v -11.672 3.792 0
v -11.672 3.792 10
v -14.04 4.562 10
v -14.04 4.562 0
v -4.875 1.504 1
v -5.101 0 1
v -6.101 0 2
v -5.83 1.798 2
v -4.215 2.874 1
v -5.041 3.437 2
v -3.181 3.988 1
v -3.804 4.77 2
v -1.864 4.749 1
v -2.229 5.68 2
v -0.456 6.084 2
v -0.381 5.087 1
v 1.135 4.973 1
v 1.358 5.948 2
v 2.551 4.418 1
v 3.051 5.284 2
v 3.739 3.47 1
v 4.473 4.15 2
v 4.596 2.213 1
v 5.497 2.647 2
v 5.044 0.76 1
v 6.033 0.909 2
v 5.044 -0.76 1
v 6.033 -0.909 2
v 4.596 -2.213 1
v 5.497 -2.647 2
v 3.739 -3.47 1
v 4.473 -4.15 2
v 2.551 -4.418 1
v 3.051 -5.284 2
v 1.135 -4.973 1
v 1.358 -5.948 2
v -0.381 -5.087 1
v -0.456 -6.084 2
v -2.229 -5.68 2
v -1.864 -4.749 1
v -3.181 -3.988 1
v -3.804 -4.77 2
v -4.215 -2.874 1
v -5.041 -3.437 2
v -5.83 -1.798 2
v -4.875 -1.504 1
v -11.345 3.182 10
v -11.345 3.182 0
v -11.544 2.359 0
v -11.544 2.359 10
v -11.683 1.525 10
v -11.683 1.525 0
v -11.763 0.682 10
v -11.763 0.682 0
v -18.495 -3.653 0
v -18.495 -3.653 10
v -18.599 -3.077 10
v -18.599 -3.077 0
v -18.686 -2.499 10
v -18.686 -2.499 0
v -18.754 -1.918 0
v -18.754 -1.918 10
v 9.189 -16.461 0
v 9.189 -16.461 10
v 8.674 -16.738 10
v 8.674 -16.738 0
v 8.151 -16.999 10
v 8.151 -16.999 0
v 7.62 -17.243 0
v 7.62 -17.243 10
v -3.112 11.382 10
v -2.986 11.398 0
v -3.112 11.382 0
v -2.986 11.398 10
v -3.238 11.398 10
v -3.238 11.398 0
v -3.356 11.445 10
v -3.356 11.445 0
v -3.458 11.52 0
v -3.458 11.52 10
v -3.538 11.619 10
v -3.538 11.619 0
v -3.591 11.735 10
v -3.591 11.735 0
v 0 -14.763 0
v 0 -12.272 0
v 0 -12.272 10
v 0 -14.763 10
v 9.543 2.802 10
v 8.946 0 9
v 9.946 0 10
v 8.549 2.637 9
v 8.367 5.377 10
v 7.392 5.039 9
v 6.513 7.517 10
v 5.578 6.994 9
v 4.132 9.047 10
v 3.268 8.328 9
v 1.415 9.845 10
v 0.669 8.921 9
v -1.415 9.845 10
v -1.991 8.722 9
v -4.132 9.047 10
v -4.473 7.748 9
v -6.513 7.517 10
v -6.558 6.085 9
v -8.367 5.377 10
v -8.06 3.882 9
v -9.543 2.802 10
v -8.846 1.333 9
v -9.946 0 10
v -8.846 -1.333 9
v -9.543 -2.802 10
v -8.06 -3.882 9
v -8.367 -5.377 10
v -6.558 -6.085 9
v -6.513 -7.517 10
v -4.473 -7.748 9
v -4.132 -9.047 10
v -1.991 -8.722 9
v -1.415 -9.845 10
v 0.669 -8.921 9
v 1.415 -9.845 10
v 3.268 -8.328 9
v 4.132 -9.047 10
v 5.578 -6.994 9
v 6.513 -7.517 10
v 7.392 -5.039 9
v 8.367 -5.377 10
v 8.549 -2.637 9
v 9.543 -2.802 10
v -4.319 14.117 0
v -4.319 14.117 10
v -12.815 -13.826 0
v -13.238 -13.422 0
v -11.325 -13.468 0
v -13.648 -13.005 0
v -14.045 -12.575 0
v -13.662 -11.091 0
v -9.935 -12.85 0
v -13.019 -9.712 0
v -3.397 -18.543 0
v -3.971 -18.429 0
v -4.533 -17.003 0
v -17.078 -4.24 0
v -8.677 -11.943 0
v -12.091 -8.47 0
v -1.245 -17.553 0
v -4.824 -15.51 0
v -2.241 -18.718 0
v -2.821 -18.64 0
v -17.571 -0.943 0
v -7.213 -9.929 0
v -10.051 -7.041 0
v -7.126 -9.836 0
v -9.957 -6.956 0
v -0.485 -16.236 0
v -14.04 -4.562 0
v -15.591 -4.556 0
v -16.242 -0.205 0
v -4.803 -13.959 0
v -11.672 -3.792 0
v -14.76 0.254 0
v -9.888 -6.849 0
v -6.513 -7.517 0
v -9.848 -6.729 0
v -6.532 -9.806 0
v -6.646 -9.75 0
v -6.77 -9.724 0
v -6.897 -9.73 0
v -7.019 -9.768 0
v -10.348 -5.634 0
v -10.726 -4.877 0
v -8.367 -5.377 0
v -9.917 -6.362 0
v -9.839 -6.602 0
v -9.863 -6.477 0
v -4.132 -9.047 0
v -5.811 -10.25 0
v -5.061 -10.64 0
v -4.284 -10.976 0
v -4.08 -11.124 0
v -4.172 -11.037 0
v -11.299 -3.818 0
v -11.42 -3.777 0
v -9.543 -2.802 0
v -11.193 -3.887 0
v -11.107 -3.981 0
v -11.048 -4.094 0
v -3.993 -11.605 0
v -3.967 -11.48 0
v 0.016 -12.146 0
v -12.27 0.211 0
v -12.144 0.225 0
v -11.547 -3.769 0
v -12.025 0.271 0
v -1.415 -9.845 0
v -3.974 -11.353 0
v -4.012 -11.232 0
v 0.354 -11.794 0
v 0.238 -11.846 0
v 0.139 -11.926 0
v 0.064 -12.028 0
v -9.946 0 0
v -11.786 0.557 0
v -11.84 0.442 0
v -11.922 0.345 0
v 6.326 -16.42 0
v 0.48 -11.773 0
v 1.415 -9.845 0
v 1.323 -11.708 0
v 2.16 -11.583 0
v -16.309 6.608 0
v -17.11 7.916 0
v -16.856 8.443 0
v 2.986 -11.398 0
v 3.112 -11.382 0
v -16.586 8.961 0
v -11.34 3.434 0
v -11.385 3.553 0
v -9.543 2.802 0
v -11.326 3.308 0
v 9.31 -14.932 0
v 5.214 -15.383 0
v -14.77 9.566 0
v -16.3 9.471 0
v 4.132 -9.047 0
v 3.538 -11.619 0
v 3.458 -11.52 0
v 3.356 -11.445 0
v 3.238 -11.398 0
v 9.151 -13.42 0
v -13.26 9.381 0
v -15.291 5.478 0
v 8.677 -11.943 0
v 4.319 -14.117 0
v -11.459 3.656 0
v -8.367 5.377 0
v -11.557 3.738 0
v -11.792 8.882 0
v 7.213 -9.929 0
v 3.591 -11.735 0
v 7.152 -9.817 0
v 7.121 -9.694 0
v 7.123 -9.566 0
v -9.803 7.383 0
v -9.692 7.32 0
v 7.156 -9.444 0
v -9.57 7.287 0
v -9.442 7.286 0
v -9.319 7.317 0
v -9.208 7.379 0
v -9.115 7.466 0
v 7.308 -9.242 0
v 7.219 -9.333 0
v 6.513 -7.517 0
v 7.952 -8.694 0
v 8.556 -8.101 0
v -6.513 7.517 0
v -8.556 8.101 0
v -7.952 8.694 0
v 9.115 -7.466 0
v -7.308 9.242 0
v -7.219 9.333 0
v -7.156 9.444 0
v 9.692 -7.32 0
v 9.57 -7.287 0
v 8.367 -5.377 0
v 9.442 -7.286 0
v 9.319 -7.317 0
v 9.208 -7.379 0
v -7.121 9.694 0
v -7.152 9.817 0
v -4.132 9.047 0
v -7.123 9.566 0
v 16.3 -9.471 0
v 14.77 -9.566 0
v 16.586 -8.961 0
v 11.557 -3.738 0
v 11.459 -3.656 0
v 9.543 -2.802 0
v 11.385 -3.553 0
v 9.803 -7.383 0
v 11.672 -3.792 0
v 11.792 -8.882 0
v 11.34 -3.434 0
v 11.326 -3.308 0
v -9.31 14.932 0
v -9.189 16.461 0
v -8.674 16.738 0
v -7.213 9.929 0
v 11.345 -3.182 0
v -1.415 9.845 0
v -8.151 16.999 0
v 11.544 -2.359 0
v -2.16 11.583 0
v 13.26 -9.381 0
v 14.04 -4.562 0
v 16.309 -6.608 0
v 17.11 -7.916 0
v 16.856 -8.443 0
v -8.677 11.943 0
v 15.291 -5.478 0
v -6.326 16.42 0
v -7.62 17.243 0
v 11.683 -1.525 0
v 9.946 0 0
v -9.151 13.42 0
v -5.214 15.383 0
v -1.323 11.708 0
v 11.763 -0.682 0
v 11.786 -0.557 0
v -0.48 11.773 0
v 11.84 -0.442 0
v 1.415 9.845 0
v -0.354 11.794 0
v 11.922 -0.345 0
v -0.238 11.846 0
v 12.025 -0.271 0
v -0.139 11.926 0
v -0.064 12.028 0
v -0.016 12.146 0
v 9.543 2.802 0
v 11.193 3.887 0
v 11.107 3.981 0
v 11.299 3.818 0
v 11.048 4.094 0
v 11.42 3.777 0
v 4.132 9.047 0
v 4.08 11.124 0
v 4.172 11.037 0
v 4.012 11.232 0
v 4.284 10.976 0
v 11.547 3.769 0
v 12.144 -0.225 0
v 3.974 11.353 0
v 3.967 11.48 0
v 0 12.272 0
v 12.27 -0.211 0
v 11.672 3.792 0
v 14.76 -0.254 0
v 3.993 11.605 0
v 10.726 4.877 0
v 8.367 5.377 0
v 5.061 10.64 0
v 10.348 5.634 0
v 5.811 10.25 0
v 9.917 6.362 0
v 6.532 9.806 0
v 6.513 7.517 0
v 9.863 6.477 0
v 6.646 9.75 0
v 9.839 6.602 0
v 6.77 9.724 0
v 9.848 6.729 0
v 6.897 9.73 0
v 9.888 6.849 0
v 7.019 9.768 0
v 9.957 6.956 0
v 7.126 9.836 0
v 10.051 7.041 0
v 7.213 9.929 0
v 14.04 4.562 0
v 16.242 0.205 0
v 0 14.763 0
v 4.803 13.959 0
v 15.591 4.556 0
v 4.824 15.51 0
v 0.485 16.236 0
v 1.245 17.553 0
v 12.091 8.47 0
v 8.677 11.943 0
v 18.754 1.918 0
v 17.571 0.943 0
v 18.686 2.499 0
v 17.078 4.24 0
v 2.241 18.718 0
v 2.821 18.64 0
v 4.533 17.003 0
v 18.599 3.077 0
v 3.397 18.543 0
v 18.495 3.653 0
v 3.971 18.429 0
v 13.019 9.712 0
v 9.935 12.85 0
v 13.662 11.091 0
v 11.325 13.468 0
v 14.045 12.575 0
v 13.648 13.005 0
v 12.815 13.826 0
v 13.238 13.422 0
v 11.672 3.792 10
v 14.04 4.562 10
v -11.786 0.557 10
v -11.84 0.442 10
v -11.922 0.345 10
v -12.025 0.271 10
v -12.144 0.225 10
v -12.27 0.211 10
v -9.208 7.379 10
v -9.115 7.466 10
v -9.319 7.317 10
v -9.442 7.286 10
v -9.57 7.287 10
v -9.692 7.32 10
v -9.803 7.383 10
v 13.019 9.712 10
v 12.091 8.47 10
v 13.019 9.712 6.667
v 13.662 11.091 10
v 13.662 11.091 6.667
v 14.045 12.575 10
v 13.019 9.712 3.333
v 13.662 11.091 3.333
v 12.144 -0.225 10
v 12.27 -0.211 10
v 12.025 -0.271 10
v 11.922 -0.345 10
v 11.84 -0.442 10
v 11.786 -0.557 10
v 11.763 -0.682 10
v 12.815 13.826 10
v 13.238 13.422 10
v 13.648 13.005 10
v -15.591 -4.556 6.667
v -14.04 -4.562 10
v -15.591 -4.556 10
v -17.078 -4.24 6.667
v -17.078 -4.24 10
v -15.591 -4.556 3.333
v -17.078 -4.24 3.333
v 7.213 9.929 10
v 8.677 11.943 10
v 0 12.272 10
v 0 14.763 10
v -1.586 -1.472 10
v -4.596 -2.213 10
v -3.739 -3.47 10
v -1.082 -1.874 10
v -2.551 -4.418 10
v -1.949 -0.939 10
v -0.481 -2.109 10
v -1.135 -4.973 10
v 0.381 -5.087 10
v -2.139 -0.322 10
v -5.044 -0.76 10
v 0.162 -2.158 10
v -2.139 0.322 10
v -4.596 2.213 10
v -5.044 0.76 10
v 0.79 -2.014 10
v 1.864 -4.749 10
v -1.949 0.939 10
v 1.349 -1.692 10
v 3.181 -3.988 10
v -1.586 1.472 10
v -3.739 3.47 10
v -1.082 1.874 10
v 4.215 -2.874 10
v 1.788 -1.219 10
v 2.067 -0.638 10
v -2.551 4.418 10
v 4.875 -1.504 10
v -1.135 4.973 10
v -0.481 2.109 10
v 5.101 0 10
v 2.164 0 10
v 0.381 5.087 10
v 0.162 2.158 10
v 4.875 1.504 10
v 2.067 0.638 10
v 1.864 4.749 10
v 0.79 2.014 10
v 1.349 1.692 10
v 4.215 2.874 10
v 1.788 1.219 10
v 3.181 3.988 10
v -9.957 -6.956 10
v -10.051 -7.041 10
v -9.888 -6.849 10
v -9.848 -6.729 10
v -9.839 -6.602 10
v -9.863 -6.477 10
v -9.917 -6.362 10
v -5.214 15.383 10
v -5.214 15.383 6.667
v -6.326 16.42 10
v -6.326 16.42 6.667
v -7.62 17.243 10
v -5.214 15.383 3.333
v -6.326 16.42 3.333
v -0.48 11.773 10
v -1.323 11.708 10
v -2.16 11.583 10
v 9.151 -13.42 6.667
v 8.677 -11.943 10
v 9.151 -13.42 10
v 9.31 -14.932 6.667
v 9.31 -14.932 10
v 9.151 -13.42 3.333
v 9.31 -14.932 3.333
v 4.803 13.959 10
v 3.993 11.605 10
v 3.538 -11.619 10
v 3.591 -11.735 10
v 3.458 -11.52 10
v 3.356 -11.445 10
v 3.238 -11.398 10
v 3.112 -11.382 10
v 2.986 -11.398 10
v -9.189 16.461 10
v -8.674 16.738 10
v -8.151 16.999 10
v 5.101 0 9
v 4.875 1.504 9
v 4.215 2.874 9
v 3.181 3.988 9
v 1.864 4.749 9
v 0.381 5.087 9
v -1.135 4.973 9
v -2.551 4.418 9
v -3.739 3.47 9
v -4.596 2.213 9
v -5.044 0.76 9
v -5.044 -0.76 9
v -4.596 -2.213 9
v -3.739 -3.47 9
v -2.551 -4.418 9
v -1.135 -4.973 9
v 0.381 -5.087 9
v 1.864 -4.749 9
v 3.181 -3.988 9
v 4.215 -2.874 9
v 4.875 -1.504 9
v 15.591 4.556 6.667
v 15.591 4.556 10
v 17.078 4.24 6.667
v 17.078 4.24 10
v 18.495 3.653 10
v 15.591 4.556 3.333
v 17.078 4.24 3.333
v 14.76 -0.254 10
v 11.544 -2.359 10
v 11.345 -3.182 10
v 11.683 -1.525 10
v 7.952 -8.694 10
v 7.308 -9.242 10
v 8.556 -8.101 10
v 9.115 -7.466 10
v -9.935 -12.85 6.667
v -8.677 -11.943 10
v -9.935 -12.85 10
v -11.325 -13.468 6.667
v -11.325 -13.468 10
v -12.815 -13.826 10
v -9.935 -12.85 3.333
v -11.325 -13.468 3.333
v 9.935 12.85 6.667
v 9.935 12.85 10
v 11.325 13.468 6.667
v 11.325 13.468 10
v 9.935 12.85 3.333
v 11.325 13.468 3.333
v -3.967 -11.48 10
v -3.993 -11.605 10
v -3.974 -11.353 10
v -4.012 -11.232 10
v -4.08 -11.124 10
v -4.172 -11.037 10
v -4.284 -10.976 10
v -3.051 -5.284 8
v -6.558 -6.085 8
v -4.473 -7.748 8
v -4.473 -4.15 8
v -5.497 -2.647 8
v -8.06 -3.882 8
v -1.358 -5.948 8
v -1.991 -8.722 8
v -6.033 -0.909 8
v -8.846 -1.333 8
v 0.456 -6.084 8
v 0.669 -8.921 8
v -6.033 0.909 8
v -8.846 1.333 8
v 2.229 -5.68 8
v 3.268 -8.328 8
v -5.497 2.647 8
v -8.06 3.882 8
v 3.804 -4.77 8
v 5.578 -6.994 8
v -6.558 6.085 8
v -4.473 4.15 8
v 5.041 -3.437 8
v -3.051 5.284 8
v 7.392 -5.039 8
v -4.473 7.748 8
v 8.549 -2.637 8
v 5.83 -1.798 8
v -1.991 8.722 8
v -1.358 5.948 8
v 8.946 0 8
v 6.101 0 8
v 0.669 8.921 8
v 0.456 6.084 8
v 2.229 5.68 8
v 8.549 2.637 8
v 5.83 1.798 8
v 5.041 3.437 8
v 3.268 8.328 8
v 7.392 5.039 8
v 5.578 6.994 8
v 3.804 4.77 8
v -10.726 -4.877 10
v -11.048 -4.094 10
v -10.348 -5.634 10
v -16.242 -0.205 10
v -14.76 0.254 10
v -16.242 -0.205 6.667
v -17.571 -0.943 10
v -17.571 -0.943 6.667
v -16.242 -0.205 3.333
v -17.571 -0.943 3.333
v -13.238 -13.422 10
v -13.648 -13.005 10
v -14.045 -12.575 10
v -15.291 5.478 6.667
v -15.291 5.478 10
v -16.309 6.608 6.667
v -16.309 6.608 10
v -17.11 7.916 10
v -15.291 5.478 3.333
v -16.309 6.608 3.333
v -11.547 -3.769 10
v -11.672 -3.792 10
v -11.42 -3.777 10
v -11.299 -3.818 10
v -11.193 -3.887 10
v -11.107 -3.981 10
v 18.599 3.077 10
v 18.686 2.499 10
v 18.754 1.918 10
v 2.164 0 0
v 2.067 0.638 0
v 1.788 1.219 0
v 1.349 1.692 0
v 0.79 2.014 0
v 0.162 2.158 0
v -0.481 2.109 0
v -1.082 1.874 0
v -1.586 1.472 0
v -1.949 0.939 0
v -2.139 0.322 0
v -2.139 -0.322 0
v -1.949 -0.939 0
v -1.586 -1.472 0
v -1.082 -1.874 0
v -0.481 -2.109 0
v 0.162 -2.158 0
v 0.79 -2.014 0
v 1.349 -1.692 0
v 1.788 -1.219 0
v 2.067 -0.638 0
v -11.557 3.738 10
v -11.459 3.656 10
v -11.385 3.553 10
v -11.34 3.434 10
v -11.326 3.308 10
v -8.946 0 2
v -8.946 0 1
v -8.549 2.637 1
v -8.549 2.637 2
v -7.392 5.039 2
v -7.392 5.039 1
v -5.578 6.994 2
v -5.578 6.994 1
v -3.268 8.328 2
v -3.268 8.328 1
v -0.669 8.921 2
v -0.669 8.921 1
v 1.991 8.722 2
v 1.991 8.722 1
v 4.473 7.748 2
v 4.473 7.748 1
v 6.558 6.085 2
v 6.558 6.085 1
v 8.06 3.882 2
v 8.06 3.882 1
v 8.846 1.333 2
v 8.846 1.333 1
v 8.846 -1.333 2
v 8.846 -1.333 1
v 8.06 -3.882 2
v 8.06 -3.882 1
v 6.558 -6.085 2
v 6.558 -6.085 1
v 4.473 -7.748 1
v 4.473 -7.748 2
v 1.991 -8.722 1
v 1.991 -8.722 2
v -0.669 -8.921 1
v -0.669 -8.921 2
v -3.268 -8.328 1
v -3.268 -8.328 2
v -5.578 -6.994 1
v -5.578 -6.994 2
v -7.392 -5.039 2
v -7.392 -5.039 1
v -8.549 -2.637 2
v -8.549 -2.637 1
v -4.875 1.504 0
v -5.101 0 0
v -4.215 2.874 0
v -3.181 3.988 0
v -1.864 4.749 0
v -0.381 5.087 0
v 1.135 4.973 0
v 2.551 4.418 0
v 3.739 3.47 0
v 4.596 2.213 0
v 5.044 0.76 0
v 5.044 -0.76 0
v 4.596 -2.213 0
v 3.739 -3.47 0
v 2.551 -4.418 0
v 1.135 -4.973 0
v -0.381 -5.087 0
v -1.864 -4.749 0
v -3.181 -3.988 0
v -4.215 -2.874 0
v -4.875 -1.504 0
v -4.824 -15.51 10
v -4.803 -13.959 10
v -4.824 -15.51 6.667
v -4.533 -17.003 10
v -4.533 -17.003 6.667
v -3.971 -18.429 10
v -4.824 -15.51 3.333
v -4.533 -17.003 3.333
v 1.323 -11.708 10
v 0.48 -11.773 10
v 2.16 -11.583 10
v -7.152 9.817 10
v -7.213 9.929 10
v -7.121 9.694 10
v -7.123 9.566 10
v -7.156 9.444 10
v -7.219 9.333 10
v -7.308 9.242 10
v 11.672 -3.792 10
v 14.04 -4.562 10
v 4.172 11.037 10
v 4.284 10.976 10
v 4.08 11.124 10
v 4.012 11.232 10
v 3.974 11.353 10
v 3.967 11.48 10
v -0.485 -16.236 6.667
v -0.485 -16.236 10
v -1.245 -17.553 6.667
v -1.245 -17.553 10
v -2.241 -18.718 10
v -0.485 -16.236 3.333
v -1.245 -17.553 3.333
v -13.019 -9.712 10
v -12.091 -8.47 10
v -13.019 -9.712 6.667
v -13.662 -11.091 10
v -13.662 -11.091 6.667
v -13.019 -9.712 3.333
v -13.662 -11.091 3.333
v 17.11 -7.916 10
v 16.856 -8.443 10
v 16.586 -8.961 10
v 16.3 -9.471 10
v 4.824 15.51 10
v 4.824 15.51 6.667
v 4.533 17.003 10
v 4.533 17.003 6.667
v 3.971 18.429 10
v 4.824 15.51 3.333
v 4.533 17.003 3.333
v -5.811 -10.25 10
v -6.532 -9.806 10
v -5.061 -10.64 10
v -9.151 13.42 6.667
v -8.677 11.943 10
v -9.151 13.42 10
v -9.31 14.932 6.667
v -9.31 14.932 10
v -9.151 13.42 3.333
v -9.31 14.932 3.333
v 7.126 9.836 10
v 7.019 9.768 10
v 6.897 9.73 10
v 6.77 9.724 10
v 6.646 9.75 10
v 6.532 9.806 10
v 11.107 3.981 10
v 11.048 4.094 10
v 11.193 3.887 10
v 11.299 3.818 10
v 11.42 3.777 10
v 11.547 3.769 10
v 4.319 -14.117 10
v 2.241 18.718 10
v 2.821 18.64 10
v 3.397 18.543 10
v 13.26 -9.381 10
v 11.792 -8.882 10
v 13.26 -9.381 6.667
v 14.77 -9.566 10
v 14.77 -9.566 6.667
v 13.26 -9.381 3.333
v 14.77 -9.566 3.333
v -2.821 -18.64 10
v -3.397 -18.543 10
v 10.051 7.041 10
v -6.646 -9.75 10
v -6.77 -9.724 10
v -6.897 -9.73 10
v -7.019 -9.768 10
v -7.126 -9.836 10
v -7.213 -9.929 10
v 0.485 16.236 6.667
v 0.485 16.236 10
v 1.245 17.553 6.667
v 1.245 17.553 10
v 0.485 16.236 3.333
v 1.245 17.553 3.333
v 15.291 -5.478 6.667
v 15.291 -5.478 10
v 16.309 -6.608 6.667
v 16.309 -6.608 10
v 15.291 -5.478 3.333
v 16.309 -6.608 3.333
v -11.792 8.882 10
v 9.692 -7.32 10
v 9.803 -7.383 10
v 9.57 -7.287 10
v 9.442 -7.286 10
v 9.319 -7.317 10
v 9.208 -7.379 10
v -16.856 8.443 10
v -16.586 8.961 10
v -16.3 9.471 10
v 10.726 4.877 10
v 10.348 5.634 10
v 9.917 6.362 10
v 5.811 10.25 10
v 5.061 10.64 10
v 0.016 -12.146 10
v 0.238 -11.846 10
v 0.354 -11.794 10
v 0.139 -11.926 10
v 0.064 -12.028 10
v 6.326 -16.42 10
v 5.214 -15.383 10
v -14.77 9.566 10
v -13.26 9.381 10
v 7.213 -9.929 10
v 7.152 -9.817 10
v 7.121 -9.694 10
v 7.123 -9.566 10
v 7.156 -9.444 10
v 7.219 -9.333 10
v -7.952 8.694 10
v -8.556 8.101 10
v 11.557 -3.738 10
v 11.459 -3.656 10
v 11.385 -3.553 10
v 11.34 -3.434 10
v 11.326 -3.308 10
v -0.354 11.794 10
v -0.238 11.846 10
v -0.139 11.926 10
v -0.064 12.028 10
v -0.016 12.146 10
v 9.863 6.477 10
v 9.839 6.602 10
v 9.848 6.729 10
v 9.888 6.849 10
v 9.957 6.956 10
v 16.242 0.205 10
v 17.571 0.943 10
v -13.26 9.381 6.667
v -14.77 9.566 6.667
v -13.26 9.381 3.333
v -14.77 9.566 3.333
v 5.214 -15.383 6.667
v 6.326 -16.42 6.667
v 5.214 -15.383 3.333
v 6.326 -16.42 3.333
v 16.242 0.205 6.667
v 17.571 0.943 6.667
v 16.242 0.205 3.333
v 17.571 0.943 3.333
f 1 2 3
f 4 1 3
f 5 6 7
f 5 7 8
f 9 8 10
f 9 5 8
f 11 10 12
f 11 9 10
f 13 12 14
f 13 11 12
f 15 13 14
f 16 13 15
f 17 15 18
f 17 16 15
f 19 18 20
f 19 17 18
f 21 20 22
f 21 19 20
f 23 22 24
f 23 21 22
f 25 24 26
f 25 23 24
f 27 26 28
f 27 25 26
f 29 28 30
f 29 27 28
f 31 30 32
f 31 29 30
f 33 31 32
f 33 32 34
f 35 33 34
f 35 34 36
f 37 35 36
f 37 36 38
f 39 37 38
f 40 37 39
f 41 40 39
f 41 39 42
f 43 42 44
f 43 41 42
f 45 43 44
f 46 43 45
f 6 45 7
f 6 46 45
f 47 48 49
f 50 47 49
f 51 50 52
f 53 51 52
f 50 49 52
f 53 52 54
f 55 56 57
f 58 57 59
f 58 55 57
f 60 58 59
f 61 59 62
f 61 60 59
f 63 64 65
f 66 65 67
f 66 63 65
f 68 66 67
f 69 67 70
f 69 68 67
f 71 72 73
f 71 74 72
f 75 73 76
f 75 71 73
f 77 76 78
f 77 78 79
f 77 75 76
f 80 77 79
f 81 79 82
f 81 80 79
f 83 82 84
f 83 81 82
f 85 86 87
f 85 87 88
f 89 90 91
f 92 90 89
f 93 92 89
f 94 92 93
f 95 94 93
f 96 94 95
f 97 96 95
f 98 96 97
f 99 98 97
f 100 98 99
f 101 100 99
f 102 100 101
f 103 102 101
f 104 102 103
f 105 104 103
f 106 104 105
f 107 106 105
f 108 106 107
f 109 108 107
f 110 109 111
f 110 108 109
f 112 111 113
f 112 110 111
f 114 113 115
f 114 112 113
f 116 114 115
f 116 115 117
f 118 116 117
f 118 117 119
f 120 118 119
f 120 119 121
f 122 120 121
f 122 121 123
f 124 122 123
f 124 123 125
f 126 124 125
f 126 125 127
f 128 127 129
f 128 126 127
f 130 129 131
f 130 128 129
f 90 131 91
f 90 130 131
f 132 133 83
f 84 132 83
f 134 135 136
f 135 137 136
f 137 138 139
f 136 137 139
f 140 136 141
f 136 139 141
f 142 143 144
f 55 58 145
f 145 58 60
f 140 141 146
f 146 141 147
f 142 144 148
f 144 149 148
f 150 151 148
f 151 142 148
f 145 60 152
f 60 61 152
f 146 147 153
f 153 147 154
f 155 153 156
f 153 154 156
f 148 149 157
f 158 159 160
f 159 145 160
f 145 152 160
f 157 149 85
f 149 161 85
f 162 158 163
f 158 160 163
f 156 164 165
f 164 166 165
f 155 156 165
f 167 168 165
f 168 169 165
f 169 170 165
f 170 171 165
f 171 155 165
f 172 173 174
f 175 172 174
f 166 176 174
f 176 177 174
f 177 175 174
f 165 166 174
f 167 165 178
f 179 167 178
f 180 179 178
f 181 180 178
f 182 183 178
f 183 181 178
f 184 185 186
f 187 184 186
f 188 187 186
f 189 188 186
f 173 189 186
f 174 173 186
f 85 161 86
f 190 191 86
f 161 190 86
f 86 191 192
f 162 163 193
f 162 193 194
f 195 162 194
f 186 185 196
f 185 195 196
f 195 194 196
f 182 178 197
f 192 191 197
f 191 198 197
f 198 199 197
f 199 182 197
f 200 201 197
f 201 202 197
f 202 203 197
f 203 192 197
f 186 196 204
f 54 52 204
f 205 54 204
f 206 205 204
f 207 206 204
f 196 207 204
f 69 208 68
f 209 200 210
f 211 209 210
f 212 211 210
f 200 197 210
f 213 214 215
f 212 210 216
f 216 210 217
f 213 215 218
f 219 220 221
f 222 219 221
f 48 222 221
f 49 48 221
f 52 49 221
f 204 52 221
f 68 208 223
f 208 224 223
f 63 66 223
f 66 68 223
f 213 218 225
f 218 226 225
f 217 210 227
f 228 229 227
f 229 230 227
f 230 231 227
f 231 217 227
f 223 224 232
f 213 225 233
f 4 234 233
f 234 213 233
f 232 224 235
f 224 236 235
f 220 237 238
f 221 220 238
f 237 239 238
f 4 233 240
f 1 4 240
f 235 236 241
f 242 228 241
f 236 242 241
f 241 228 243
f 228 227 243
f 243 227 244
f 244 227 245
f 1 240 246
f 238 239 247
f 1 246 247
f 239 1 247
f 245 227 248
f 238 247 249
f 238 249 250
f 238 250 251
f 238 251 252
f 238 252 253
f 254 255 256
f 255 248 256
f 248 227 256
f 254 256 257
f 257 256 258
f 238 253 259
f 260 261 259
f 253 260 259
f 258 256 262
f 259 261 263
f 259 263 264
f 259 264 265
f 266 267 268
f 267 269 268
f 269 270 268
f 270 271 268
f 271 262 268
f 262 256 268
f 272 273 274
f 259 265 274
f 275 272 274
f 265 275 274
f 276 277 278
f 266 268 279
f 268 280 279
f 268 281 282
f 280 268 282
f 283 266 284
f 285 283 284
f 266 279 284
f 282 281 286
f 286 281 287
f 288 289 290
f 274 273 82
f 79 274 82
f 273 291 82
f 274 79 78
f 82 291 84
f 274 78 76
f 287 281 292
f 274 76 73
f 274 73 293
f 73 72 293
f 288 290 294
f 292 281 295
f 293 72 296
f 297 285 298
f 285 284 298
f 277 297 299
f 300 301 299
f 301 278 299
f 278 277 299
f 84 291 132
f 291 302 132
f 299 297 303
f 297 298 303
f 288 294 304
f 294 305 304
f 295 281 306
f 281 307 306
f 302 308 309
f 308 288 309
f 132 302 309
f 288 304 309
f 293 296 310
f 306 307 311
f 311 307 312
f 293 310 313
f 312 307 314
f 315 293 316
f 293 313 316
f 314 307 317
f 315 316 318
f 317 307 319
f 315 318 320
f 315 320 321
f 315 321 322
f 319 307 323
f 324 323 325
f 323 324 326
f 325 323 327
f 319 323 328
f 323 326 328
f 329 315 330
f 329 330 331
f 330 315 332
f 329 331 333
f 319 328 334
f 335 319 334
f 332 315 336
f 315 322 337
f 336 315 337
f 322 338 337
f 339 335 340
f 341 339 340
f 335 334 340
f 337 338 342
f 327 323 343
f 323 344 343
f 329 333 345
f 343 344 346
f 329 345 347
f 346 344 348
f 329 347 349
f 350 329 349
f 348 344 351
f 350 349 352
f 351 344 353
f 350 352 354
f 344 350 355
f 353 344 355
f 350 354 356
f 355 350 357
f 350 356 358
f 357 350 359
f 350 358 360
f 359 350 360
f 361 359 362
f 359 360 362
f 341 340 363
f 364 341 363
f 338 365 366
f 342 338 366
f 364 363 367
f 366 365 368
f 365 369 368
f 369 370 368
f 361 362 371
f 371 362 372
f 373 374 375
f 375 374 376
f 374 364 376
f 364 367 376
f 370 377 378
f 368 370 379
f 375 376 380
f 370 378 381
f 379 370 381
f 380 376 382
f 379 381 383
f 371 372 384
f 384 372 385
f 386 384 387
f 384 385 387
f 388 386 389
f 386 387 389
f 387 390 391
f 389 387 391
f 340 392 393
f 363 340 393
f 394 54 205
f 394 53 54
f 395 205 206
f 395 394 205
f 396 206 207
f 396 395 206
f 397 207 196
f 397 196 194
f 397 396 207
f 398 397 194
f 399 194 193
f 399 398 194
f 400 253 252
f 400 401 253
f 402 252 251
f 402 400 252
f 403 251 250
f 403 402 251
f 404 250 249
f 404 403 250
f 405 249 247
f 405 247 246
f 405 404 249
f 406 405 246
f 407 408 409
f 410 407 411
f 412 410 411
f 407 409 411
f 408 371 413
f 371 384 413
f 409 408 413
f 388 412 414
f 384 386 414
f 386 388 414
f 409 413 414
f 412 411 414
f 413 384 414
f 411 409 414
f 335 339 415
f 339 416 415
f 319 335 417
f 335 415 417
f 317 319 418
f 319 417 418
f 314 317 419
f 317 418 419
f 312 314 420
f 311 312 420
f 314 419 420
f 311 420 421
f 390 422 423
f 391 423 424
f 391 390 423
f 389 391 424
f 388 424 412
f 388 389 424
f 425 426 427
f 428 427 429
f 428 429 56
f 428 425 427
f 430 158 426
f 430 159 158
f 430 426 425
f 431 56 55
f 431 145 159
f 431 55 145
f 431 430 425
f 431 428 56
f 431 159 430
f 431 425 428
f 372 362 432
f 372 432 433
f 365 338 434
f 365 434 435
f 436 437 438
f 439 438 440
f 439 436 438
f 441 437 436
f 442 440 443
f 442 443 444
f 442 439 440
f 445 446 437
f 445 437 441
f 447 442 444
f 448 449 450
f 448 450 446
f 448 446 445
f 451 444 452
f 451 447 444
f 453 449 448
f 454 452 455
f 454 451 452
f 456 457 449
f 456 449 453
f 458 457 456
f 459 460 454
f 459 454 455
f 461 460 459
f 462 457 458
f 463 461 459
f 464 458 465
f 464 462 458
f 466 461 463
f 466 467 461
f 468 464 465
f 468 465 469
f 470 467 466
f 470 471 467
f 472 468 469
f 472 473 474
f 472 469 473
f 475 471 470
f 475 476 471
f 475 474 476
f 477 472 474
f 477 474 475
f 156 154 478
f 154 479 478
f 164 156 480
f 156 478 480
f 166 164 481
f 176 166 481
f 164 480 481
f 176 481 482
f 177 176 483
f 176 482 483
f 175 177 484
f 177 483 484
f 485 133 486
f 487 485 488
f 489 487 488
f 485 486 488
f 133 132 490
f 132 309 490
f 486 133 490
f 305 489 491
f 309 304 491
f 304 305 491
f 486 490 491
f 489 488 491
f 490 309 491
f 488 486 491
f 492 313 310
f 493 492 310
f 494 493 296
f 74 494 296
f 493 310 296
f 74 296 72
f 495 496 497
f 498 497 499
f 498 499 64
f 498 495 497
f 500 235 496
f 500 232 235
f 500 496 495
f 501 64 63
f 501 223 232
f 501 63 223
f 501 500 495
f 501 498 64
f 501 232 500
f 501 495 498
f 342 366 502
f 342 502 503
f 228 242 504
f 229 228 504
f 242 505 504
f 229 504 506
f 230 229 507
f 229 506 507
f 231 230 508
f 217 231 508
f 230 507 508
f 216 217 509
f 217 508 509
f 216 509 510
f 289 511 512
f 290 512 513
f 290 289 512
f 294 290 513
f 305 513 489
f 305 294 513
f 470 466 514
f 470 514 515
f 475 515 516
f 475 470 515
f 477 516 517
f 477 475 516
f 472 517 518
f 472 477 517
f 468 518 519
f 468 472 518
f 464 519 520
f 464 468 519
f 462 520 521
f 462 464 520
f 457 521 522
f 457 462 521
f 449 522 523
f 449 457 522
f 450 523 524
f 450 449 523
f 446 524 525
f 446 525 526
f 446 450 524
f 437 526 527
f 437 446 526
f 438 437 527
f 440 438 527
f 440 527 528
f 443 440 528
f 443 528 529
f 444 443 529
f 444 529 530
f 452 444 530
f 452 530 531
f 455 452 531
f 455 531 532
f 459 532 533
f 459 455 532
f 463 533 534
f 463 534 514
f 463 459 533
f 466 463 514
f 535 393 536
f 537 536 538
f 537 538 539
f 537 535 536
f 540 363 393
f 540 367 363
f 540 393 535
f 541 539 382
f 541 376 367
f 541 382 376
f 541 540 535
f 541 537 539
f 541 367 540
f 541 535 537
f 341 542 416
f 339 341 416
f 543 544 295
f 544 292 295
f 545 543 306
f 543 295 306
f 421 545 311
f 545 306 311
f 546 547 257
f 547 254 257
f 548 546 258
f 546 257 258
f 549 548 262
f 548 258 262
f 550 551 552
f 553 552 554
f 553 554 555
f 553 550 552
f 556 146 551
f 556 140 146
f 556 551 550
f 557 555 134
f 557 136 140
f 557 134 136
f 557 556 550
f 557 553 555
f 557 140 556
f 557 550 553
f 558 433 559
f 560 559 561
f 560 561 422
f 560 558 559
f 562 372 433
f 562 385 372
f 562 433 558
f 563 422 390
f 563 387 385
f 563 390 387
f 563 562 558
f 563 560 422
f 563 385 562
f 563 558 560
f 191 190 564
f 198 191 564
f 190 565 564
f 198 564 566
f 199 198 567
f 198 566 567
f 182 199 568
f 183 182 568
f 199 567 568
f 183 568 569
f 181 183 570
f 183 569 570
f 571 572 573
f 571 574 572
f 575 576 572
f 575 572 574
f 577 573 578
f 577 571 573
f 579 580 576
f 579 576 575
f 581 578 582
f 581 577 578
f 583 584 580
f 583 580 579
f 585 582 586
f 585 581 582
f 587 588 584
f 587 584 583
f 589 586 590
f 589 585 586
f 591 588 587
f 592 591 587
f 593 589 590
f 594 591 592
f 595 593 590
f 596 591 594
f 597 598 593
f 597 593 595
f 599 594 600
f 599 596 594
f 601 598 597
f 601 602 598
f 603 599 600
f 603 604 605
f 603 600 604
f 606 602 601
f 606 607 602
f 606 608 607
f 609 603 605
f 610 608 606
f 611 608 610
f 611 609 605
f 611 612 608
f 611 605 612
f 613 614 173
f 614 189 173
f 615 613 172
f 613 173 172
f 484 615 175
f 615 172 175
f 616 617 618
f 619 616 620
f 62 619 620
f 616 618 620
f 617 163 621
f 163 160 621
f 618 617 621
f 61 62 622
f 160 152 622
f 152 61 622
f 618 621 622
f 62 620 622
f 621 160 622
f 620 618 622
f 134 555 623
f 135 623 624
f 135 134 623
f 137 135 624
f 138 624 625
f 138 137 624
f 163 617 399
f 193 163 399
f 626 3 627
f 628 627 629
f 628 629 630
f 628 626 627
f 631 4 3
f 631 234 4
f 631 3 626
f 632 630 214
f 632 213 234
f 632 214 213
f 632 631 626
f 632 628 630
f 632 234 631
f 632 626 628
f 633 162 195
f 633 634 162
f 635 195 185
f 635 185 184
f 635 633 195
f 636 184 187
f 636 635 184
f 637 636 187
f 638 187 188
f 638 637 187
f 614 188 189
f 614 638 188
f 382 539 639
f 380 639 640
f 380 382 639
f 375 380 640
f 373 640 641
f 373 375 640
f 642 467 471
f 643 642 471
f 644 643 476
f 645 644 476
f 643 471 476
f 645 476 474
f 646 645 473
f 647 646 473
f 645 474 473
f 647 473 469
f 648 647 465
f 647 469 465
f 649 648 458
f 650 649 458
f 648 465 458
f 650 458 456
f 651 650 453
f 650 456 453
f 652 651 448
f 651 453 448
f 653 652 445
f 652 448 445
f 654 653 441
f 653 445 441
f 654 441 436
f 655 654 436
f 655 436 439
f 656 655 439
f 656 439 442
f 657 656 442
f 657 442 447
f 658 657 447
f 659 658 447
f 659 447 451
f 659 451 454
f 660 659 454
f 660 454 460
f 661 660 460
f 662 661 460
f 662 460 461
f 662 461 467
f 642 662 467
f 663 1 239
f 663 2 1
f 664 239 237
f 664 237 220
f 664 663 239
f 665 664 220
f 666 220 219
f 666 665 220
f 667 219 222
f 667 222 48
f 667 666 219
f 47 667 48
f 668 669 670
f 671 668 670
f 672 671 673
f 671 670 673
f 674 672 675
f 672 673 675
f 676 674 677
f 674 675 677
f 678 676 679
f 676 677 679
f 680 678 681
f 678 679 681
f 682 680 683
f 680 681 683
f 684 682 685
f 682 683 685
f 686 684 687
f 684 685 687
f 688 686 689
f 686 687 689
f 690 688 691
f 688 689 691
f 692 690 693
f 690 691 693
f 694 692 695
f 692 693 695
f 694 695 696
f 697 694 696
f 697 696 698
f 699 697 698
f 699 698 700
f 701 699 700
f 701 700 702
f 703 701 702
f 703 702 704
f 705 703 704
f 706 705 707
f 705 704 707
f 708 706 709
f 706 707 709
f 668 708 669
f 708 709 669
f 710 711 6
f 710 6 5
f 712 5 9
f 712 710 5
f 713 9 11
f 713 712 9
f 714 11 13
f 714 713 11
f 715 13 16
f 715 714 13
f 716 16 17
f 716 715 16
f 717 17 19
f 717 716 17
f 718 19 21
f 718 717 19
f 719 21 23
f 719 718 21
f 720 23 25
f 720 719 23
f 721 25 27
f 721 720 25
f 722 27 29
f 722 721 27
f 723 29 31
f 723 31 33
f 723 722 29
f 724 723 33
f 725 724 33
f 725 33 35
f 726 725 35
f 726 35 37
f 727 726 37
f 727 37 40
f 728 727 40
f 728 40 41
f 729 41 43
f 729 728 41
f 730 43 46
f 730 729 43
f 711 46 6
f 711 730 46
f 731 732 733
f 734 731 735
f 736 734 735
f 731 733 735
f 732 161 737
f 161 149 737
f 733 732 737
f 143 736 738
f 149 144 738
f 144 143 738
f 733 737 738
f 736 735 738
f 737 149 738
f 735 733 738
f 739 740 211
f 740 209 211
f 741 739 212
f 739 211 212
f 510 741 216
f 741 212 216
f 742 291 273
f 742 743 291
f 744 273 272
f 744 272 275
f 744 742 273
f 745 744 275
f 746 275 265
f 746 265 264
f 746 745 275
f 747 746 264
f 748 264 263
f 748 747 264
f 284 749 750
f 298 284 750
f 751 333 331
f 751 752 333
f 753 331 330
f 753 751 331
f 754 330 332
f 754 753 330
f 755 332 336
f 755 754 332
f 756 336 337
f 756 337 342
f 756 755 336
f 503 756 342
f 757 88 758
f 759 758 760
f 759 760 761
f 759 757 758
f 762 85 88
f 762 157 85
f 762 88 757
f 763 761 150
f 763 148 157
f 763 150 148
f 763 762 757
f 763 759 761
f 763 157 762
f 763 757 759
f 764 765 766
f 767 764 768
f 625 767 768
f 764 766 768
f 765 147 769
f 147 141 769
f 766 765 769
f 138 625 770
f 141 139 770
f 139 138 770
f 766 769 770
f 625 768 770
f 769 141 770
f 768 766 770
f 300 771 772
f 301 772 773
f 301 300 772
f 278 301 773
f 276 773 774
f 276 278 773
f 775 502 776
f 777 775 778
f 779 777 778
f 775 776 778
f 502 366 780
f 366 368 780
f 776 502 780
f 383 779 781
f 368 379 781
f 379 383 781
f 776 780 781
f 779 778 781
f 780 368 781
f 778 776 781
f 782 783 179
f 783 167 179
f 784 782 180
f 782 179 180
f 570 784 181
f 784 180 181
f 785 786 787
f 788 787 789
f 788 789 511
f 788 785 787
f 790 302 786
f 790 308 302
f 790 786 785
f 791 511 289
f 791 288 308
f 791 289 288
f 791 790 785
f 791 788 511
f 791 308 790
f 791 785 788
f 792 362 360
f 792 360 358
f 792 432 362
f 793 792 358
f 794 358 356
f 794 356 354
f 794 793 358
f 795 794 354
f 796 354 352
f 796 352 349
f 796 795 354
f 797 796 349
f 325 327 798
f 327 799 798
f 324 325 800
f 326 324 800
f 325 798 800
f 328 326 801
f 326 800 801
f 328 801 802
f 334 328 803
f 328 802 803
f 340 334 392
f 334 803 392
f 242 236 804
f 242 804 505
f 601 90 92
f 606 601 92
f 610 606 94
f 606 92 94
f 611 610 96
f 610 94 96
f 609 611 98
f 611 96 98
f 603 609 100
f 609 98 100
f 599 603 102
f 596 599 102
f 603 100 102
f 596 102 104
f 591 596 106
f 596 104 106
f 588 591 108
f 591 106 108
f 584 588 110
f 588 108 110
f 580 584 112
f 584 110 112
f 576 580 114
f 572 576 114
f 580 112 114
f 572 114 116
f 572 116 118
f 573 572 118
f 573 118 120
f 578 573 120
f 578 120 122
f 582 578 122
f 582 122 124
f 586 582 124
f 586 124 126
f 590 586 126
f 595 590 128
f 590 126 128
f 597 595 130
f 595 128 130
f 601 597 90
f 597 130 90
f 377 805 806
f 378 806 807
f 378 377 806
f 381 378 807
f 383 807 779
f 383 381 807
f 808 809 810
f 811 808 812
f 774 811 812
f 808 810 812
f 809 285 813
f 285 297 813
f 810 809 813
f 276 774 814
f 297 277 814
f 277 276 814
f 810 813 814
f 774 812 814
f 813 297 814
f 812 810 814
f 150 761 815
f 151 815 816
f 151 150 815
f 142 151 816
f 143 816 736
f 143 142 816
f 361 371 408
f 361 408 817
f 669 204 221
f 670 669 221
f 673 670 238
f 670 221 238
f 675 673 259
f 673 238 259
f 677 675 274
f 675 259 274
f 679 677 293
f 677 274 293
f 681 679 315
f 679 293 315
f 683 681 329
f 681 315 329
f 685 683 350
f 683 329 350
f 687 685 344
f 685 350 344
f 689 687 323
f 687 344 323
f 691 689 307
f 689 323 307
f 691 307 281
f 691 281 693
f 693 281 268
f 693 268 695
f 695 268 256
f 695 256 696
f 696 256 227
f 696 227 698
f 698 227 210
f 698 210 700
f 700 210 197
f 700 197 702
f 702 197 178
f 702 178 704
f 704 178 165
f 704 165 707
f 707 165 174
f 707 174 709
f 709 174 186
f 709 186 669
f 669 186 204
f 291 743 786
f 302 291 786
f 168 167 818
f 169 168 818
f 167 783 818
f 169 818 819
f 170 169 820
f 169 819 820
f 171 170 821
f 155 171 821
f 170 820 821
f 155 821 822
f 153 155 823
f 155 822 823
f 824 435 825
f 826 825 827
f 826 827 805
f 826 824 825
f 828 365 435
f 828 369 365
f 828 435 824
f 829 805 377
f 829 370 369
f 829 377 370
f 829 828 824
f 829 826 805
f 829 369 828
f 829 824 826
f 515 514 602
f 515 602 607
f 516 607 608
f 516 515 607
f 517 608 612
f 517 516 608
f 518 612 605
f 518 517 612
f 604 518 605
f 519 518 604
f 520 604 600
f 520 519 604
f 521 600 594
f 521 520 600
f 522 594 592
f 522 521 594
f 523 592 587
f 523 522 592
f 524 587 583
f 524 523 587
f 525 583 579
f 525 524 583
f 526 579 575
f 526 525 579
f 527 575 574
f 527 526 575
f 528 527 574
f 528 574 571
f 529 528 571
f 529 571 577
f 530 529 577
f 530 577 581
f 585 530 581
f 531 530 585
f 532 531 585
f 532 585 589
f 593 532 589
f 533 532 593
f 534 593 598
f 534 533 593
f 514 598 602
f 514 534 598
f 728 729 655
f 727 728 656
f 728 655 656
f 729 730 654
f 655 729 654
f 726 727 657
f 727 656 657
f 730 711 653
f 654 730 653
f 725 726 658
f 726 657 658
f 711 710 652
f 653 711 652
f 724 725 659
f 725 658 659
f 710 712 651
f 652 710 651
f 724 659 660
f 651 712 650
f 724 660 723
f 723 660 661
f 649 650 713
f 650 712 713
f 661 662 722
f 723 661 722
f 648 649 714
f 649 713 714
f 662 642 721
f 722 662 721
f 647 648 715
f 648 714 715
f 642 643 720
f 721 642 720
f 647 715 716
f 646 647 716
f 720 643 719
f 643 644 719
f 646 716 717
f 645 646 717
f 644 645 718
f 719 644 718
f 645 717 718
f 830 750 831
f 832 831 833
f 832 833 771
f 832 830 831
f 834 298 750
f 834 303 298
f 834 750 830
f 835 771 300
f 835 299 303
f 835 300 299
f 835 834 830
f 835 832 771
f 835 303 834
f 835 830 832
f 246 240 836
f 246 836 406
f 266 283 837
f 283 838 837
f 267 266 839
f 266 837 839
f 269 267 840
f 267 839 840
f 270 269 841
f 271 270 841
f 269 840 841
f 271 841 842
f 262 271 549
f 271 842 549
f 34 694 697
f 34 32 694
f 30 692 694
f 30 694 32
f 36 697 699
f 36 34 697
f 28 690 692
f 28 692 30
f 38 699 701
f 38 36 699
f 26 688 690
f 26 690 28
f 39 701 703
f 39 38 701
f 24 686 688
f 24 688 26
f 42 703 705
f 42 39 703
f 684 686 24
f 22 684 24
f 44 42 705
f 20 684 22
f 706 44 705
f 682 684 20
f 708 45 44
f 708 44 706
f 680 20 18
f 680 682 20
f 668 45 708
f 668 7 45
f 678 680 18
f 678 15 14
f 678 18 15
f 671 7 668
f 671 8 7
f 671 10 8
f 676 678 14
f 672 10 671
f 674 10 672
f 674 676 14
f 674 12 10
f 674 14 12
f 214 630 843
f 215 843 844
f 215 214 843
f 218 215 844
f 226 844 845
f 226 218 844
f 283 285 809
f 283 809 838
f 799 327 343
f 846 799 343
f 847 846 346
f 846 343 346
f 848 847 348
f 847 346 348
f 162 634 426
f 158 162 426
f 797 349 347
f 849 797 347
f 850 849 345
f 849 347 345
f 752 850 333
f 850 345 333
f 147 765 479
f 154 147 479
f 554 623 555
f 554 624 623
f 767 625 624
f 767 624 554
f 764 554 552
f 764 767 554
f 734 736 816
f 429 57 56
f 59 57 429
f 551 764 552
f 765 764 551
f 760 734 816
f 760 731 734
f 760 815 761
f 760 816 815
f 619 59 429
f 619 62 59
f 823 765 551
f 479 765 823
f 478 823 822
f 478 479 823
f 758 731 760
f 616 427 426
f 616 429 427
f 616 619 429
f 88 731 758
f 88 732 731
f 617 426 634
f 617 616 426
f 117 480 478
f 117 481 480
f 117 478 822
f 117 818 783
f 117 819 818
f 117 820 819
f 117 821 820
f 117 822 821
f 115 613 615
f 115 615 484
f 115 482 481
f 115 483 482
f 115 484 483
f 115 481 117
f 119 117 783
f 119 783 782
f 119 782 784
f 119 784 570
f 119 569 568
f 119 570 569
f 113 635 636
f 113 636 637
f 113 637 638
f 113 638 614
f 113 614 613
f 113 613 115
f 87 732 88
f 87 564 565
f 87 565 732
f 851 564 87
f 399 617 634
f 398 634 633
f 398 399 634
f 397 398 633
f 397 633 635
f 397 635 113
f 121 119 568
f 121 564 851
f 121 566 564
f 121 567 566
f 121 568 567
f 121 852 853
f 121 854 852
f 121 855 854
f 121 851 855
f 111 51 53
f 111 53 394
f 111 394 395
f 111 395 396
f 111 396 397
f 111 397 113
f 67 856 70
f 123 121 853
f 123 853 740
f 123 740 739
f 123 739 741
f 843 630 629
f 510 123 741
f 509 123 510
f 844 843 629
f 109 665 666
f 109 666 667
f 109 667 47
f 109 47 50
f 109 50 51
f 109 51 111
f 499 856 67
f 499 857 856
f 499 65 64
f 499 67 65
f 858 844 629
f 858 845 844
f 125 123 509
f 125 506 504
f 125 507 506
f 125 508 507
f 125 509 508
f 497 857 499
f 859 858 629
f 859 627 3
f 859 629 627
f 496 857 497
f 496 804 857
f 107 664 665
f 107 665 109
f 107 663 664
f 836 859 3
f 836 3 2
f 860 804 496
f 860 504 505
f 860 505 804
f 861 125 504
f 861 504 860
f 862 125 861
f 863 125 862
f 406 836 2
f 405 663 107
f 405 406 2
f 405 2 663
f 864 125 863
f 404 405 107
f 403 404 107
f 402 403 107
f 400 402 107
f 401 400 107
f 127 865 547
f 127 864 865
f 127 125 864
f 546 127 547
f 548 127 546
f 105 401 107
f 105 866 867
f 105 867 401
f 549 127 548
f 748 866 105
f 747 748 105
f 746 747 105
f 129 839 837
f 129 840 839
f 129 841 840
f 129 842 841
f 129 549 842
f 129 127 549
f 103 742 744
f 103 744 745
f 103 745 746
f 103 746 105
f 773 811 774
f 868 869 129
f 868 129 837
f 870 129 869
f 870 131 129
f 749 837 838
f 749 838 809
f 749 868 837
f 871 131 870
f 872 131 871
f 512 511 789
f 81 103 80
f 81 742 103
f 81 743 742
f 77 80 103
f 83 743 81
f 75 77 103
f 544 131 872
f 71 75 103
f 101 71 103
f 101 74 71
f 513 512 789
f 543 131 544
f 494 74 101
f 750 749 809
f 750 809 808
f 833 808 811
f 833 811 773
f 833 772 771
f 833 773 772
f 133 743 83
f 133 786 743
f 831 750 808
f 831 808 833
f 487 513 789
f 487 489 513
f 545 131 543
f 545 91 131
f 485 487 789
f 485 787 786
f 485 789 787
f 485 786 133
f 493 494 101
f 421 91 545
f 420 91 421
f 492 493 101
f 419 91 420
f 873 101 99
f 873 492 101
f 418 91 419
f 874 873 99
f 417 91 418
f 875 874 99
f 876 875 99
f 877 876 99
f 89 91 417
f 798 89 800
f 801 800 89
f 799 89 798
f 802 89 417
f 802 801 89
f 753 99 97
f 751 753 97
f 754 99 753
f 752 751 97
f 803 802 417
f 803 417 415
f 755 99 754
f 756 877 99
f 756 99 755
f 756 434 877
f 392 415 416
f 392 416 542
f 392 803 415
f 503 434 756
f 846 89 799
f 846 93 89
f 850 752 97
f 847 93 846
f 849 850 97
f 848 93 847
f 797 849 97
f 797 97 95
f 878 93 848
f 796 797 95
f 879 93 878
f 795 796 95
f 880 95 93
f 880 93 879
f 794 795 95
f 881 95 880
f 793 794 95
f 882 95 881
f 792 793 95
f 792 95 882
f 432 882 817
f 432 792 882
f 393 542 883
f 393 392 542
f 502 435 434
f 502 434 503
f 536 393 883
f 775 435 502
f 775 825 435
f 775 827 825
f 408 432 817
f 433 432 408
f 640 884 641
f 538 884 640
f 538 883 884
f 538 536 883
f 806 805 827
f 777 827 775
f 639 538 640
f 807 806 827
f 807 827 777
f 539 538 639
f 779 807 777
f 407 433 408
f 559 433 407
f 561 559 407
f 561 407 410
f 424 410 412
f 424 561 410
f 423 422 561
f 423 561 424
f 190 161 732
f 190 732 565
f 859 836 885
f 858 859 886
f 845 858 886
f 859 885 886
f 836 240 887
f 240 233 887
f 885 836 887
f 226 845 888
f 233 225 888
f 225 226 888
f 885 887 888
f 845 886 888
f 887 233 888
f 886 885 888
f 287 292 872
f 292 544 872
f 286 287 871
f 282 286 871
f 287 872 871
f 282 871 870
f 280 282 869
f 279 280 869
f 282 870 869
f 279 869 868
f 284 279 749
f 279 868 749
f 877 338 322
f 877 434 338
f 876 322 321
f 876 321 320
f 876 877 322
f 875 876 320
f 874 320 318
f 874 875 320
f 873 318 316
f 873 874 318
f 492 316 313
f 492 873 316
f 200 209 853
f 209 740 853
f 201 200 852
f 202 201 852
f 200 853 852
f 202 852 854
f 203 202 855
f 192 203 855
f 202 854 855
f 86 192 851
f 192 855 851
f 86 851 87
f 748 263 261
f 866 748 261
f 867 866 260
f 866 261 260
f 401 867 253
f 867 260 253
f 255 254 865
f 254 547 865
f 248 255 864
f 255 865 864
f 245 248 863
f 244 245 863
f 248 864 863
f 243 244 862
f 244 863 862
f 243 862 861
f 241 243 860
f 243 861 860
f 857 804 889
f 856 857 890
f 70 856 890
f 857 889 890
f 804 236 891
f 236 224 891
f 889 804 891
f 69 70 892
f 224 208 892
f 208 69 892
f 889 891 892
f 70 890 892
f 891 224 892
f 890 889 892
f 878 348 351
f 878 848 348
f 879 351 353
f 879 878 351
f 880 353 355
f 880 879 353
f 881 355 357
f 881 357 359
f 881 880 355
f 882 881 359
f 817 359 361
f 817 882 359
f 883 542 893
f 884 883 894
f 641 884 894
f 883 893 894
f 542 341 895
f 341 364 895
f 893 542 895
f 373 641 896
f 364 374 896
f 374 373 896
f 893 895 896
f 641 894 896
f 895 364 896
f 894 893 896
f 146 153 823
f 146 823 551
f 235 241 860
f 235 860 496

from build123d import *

# Parameters (mm, degrees)
BOSS_EXTRUDE1_DEPTH = 10
CIRPATTERN1_COUNT   = 10
SKETCH1_R           = 11.7825
BOSS_EXTRUDE2_DEPTH = 10
SKETCH4_R           = 8.946052481
SKETCH4_R_2         = 5.101265003
CUT_EXTRUDE1_DEPTH  = 2
SKETCH4_3_R         = 2.163600103
CUT_EXTRUDE2_DEPTH  = 29.32125352
CUT_EXTRUDE3_START  = -2
SKETCH5_R           = 8.946052481
SKETCH5_R_2         = 5.101265003
CUT_EXTRUDE3_DEPTH  = 2
FILLET1_R           = 0.5
CHAMFER1_SIZE       = 1
CHAMFER2_SIZE       = 1


with BuildPart() as part:
    # Sketch3 → Boss-Extrude1 (new body)
    with BuildSketch(Plane.XY):
        with BuildLine():
            Line((4.803075617, 13.959368513), (3.833494733, 11.141437267))
            ThreePointArc((3.833494733, 11.141437267), (1.943363276, 11.621129266), (0, 11.7825))
            Line((0, 11.7825), (0, 14.762571073))
            add(Edge.make_bspline(
                [(0, 14.762571073), (0.333518774, 16.315241106), (1.140884964, 17.626707575), (2.241097954, 18.718316804)],
                knots=[0, 0, 0, 0, 0.256830749, 0.256830749, 0.256830749, 0.256830749], degree=3))
            ThreePointArc((2.241097954, 18.718316804), (3.109381242, 18.593806826), (3.970932877, 18.429042191))
            add(Edge.make_bspline(
                [(4.803075617, 13.959368513), (4.992871831, 15.536072798), (4.656124965, 17.038865536), (3.970932877, 18.429042191)],
                knots=[0, 0, 0, 0, 0.256830749, 0.256830749, 0.256830749, 0.256830749], degree=3))
        make_face()
    extrude(amount=BOSS_EXTRUDE1_DEPTH)


with BuildPart() as cirpattern1_1:
    # CirPattern1: pattern copy
    add(part.part.rotate(Axis((0, 0, 0), (0, 0, 1)), 1 * 360 / CIRPATTERN1_COUNT))


with BuildPart() as cirpattern1_2:
    # CirPattern1: pattern copy
    add(part.part.rotate(Axis((0, 0, 0), (0, 0, 1)), 2 * 360 / CIRPATTERN1_COUNT))


with BuildPart() as cirpattern1_3:
    # CirPattern1: pattern copy
    add(part.part.rotate(Axis((0, 0, 0), (0, 0, 1)), 3 * 360 / CIRPATTERN1_COUNT))


with BuildPart() as cirpattern1_4:
    # CirPattern1: pattern copy
    add(part.part.rotate(Axis((0, 0, 0), (0, 0, 1)), 4 * 360 / CIRPATTERN1_COUNT))


with BuildPart() as cirpattern1_5:
    # CirPattern1: pattern copy
    add(part.part.rotate(Axis((0, 0, 0), (0, 0, 1)), 5 * 360 / CIRPATTERN1_COUNT))


with BuildPart() as cirpattern1_6:
    # CirPattern1: pattern copy
    add(part.part.rotate(Axis((0, 0, 0), (0, 0, 1)), 6 * 360 / CIRPATTERN1_COUNT))


with BuildPart() as cirpattern1_7:
    # CirPattern1: pattern copy
    add(part.part.rotate(Axis((0, 0, 0), (0, 0, 1)), 7 * 360 / CIRPATTERN1_COUNT))


with BuildPart() as cirpattern1_8:
    # CirPattern1: pattern copy
    add(part.part.rotate(Axis((0, 0, 0), (0, 0, 1)), 8 * 360 / CIRPATTERN1_COUNT))


with BuildPart() as cirpattern1_9:
    # CirPattern1: pattern copy
    add(part.part.rotate(Axis((0, 0, 0), (0, 0, 1)), 9 * 360 / CIRPATTERN1_COUNT))


with BuildPart() as part_1:
    add(part.part)

    add(cirpattern1_1.part)  # Boss-Extrude2 merges CirPattern1_1

    add(cirpattern1_2.part)  # Boss-Extrude2 merges CirPattern1_2

    add(cirpattern1_3.part)  # Boss-Extrude2 merges CirPattern1_3

    add(cirpattern1_4.part)  # Boss-Extrude2 merges CirPattern1_4

    add(cirpattern1_5.part)  # Boss-Extrude2 merges CirPattern1_5

    add(cirpattern1_6.part)  # Boss-Extrude2 merges CirPattern1_6

    add(cirpattern1_7.part)  # Boss-Extrude2 merges CirPattern1_7

    add(cirpattern1_8.part)  # Boss-Extrude2 merges CirPattern1_8

    add(cirpattern1_9.part)  # Boss-Extrude2 merges CirPattern1_9
    # Sketch1 → Boss-Extrude2 (add)
    with BuildSketch(Plane.XY):
        Circle(SKETCH1_R)
    extrude(amount=BOSS_EXTRUDE2_DEPTH)

    # Sketch4 → Cut-Extrude1 (cut)
    with BuildSketch(Plane.XY.offset(10)):
        Circle(SKETCH4_R)
        Circle(SKETCH4_R_2, mode=Mode.SUBTRACT)
    extrude(amount=-CUT_EXTRUDE1_DEPTH, mode=Mode.SUBTRACT)

    # Sketch4<3> → Cut-Extrude2 (cut, through all)
    with BuildSketch(Plane.XY.offset(10)):
        Circle(SKETCH4_3_R)
    extrude(amount=-CUT_EXTRUDE2_DEPTH, mode=Mode.SUBTRACT)

    # Sketch5 → Cut-Extrude3 (cut)
    with BuildSketch(Plane(origin=(0, 0, 0), x_dir=(-1, 0, 0), z_dir=(0, 0, -1)).offset(CUT_EXTRUDE3_START)):
        Circle(SKETCH5_R)
        Circle(SKETCH5_R_2, mode=Mode.SUBTRACT)
    extrude(amount=CUT_EXTRUDE3_DEPTH, mode=Mode.SUBTRACT)

    # Fillet1
    fillet1_edges = [part_1.edges().sort_by_distance(p)[0] for p in [
        (-3.447410128, 11.26688376, 5),
        (-11.205823403, 3.640992736, 5),
        (-6.925579735, 9.532242736, 5),
        (-9.650134902, -6.760340422, 5),
        (-11.780751534, 0.202976689, 5),
        (-9.411521493, 7.088763604, 5),
        (0, 11.7825, 5),
        (6.925579735, 9.532242736, 5),
        (-3.833494733, -11.141437267, 5),
        (-11.205823403, -3.640992736, 5),
        (-6.925579735, -9.532242736, 5),
        (0, -11.7825, 5),
        (3.447410128, -11.26688376, 5),
        (9.411521493, -7.088763604, 5),
        (3.833494733, 11.141437267, 5),
        (6.925579735, -9.532242736, 5),
        (11.205823403, -3.640992736, 5),
        (11.780751534, -0.202976689, 5),
        (11.205823403, 3.640992736, 5),
        (9.650134902, 6.760340422, 5),
    ]]
    fillet(fillet1_edges, radius=FILLET1_R)

    # Chamfer1
    chamfer1_edges = [part_1.edges().sort_by_distance(p)[0] for p in [
        (-5.101265003, 0, 8),
        (5.101265003, 0, 2),
    ]]
    chamfer(chamfer1_edges, length=CHAMFER1_SIZE)

    # Chamfer2
    chamfer2_edges = [part_1.edges().sort_by_distance(p)[0] for p in [
        (-8.946052481, 0, 10),
        (8.946052481, 0, 0),
    ]]
    chamfer(chamfer2_edges, length=CHAMFER2_SIZE)


solid = part_1.part
